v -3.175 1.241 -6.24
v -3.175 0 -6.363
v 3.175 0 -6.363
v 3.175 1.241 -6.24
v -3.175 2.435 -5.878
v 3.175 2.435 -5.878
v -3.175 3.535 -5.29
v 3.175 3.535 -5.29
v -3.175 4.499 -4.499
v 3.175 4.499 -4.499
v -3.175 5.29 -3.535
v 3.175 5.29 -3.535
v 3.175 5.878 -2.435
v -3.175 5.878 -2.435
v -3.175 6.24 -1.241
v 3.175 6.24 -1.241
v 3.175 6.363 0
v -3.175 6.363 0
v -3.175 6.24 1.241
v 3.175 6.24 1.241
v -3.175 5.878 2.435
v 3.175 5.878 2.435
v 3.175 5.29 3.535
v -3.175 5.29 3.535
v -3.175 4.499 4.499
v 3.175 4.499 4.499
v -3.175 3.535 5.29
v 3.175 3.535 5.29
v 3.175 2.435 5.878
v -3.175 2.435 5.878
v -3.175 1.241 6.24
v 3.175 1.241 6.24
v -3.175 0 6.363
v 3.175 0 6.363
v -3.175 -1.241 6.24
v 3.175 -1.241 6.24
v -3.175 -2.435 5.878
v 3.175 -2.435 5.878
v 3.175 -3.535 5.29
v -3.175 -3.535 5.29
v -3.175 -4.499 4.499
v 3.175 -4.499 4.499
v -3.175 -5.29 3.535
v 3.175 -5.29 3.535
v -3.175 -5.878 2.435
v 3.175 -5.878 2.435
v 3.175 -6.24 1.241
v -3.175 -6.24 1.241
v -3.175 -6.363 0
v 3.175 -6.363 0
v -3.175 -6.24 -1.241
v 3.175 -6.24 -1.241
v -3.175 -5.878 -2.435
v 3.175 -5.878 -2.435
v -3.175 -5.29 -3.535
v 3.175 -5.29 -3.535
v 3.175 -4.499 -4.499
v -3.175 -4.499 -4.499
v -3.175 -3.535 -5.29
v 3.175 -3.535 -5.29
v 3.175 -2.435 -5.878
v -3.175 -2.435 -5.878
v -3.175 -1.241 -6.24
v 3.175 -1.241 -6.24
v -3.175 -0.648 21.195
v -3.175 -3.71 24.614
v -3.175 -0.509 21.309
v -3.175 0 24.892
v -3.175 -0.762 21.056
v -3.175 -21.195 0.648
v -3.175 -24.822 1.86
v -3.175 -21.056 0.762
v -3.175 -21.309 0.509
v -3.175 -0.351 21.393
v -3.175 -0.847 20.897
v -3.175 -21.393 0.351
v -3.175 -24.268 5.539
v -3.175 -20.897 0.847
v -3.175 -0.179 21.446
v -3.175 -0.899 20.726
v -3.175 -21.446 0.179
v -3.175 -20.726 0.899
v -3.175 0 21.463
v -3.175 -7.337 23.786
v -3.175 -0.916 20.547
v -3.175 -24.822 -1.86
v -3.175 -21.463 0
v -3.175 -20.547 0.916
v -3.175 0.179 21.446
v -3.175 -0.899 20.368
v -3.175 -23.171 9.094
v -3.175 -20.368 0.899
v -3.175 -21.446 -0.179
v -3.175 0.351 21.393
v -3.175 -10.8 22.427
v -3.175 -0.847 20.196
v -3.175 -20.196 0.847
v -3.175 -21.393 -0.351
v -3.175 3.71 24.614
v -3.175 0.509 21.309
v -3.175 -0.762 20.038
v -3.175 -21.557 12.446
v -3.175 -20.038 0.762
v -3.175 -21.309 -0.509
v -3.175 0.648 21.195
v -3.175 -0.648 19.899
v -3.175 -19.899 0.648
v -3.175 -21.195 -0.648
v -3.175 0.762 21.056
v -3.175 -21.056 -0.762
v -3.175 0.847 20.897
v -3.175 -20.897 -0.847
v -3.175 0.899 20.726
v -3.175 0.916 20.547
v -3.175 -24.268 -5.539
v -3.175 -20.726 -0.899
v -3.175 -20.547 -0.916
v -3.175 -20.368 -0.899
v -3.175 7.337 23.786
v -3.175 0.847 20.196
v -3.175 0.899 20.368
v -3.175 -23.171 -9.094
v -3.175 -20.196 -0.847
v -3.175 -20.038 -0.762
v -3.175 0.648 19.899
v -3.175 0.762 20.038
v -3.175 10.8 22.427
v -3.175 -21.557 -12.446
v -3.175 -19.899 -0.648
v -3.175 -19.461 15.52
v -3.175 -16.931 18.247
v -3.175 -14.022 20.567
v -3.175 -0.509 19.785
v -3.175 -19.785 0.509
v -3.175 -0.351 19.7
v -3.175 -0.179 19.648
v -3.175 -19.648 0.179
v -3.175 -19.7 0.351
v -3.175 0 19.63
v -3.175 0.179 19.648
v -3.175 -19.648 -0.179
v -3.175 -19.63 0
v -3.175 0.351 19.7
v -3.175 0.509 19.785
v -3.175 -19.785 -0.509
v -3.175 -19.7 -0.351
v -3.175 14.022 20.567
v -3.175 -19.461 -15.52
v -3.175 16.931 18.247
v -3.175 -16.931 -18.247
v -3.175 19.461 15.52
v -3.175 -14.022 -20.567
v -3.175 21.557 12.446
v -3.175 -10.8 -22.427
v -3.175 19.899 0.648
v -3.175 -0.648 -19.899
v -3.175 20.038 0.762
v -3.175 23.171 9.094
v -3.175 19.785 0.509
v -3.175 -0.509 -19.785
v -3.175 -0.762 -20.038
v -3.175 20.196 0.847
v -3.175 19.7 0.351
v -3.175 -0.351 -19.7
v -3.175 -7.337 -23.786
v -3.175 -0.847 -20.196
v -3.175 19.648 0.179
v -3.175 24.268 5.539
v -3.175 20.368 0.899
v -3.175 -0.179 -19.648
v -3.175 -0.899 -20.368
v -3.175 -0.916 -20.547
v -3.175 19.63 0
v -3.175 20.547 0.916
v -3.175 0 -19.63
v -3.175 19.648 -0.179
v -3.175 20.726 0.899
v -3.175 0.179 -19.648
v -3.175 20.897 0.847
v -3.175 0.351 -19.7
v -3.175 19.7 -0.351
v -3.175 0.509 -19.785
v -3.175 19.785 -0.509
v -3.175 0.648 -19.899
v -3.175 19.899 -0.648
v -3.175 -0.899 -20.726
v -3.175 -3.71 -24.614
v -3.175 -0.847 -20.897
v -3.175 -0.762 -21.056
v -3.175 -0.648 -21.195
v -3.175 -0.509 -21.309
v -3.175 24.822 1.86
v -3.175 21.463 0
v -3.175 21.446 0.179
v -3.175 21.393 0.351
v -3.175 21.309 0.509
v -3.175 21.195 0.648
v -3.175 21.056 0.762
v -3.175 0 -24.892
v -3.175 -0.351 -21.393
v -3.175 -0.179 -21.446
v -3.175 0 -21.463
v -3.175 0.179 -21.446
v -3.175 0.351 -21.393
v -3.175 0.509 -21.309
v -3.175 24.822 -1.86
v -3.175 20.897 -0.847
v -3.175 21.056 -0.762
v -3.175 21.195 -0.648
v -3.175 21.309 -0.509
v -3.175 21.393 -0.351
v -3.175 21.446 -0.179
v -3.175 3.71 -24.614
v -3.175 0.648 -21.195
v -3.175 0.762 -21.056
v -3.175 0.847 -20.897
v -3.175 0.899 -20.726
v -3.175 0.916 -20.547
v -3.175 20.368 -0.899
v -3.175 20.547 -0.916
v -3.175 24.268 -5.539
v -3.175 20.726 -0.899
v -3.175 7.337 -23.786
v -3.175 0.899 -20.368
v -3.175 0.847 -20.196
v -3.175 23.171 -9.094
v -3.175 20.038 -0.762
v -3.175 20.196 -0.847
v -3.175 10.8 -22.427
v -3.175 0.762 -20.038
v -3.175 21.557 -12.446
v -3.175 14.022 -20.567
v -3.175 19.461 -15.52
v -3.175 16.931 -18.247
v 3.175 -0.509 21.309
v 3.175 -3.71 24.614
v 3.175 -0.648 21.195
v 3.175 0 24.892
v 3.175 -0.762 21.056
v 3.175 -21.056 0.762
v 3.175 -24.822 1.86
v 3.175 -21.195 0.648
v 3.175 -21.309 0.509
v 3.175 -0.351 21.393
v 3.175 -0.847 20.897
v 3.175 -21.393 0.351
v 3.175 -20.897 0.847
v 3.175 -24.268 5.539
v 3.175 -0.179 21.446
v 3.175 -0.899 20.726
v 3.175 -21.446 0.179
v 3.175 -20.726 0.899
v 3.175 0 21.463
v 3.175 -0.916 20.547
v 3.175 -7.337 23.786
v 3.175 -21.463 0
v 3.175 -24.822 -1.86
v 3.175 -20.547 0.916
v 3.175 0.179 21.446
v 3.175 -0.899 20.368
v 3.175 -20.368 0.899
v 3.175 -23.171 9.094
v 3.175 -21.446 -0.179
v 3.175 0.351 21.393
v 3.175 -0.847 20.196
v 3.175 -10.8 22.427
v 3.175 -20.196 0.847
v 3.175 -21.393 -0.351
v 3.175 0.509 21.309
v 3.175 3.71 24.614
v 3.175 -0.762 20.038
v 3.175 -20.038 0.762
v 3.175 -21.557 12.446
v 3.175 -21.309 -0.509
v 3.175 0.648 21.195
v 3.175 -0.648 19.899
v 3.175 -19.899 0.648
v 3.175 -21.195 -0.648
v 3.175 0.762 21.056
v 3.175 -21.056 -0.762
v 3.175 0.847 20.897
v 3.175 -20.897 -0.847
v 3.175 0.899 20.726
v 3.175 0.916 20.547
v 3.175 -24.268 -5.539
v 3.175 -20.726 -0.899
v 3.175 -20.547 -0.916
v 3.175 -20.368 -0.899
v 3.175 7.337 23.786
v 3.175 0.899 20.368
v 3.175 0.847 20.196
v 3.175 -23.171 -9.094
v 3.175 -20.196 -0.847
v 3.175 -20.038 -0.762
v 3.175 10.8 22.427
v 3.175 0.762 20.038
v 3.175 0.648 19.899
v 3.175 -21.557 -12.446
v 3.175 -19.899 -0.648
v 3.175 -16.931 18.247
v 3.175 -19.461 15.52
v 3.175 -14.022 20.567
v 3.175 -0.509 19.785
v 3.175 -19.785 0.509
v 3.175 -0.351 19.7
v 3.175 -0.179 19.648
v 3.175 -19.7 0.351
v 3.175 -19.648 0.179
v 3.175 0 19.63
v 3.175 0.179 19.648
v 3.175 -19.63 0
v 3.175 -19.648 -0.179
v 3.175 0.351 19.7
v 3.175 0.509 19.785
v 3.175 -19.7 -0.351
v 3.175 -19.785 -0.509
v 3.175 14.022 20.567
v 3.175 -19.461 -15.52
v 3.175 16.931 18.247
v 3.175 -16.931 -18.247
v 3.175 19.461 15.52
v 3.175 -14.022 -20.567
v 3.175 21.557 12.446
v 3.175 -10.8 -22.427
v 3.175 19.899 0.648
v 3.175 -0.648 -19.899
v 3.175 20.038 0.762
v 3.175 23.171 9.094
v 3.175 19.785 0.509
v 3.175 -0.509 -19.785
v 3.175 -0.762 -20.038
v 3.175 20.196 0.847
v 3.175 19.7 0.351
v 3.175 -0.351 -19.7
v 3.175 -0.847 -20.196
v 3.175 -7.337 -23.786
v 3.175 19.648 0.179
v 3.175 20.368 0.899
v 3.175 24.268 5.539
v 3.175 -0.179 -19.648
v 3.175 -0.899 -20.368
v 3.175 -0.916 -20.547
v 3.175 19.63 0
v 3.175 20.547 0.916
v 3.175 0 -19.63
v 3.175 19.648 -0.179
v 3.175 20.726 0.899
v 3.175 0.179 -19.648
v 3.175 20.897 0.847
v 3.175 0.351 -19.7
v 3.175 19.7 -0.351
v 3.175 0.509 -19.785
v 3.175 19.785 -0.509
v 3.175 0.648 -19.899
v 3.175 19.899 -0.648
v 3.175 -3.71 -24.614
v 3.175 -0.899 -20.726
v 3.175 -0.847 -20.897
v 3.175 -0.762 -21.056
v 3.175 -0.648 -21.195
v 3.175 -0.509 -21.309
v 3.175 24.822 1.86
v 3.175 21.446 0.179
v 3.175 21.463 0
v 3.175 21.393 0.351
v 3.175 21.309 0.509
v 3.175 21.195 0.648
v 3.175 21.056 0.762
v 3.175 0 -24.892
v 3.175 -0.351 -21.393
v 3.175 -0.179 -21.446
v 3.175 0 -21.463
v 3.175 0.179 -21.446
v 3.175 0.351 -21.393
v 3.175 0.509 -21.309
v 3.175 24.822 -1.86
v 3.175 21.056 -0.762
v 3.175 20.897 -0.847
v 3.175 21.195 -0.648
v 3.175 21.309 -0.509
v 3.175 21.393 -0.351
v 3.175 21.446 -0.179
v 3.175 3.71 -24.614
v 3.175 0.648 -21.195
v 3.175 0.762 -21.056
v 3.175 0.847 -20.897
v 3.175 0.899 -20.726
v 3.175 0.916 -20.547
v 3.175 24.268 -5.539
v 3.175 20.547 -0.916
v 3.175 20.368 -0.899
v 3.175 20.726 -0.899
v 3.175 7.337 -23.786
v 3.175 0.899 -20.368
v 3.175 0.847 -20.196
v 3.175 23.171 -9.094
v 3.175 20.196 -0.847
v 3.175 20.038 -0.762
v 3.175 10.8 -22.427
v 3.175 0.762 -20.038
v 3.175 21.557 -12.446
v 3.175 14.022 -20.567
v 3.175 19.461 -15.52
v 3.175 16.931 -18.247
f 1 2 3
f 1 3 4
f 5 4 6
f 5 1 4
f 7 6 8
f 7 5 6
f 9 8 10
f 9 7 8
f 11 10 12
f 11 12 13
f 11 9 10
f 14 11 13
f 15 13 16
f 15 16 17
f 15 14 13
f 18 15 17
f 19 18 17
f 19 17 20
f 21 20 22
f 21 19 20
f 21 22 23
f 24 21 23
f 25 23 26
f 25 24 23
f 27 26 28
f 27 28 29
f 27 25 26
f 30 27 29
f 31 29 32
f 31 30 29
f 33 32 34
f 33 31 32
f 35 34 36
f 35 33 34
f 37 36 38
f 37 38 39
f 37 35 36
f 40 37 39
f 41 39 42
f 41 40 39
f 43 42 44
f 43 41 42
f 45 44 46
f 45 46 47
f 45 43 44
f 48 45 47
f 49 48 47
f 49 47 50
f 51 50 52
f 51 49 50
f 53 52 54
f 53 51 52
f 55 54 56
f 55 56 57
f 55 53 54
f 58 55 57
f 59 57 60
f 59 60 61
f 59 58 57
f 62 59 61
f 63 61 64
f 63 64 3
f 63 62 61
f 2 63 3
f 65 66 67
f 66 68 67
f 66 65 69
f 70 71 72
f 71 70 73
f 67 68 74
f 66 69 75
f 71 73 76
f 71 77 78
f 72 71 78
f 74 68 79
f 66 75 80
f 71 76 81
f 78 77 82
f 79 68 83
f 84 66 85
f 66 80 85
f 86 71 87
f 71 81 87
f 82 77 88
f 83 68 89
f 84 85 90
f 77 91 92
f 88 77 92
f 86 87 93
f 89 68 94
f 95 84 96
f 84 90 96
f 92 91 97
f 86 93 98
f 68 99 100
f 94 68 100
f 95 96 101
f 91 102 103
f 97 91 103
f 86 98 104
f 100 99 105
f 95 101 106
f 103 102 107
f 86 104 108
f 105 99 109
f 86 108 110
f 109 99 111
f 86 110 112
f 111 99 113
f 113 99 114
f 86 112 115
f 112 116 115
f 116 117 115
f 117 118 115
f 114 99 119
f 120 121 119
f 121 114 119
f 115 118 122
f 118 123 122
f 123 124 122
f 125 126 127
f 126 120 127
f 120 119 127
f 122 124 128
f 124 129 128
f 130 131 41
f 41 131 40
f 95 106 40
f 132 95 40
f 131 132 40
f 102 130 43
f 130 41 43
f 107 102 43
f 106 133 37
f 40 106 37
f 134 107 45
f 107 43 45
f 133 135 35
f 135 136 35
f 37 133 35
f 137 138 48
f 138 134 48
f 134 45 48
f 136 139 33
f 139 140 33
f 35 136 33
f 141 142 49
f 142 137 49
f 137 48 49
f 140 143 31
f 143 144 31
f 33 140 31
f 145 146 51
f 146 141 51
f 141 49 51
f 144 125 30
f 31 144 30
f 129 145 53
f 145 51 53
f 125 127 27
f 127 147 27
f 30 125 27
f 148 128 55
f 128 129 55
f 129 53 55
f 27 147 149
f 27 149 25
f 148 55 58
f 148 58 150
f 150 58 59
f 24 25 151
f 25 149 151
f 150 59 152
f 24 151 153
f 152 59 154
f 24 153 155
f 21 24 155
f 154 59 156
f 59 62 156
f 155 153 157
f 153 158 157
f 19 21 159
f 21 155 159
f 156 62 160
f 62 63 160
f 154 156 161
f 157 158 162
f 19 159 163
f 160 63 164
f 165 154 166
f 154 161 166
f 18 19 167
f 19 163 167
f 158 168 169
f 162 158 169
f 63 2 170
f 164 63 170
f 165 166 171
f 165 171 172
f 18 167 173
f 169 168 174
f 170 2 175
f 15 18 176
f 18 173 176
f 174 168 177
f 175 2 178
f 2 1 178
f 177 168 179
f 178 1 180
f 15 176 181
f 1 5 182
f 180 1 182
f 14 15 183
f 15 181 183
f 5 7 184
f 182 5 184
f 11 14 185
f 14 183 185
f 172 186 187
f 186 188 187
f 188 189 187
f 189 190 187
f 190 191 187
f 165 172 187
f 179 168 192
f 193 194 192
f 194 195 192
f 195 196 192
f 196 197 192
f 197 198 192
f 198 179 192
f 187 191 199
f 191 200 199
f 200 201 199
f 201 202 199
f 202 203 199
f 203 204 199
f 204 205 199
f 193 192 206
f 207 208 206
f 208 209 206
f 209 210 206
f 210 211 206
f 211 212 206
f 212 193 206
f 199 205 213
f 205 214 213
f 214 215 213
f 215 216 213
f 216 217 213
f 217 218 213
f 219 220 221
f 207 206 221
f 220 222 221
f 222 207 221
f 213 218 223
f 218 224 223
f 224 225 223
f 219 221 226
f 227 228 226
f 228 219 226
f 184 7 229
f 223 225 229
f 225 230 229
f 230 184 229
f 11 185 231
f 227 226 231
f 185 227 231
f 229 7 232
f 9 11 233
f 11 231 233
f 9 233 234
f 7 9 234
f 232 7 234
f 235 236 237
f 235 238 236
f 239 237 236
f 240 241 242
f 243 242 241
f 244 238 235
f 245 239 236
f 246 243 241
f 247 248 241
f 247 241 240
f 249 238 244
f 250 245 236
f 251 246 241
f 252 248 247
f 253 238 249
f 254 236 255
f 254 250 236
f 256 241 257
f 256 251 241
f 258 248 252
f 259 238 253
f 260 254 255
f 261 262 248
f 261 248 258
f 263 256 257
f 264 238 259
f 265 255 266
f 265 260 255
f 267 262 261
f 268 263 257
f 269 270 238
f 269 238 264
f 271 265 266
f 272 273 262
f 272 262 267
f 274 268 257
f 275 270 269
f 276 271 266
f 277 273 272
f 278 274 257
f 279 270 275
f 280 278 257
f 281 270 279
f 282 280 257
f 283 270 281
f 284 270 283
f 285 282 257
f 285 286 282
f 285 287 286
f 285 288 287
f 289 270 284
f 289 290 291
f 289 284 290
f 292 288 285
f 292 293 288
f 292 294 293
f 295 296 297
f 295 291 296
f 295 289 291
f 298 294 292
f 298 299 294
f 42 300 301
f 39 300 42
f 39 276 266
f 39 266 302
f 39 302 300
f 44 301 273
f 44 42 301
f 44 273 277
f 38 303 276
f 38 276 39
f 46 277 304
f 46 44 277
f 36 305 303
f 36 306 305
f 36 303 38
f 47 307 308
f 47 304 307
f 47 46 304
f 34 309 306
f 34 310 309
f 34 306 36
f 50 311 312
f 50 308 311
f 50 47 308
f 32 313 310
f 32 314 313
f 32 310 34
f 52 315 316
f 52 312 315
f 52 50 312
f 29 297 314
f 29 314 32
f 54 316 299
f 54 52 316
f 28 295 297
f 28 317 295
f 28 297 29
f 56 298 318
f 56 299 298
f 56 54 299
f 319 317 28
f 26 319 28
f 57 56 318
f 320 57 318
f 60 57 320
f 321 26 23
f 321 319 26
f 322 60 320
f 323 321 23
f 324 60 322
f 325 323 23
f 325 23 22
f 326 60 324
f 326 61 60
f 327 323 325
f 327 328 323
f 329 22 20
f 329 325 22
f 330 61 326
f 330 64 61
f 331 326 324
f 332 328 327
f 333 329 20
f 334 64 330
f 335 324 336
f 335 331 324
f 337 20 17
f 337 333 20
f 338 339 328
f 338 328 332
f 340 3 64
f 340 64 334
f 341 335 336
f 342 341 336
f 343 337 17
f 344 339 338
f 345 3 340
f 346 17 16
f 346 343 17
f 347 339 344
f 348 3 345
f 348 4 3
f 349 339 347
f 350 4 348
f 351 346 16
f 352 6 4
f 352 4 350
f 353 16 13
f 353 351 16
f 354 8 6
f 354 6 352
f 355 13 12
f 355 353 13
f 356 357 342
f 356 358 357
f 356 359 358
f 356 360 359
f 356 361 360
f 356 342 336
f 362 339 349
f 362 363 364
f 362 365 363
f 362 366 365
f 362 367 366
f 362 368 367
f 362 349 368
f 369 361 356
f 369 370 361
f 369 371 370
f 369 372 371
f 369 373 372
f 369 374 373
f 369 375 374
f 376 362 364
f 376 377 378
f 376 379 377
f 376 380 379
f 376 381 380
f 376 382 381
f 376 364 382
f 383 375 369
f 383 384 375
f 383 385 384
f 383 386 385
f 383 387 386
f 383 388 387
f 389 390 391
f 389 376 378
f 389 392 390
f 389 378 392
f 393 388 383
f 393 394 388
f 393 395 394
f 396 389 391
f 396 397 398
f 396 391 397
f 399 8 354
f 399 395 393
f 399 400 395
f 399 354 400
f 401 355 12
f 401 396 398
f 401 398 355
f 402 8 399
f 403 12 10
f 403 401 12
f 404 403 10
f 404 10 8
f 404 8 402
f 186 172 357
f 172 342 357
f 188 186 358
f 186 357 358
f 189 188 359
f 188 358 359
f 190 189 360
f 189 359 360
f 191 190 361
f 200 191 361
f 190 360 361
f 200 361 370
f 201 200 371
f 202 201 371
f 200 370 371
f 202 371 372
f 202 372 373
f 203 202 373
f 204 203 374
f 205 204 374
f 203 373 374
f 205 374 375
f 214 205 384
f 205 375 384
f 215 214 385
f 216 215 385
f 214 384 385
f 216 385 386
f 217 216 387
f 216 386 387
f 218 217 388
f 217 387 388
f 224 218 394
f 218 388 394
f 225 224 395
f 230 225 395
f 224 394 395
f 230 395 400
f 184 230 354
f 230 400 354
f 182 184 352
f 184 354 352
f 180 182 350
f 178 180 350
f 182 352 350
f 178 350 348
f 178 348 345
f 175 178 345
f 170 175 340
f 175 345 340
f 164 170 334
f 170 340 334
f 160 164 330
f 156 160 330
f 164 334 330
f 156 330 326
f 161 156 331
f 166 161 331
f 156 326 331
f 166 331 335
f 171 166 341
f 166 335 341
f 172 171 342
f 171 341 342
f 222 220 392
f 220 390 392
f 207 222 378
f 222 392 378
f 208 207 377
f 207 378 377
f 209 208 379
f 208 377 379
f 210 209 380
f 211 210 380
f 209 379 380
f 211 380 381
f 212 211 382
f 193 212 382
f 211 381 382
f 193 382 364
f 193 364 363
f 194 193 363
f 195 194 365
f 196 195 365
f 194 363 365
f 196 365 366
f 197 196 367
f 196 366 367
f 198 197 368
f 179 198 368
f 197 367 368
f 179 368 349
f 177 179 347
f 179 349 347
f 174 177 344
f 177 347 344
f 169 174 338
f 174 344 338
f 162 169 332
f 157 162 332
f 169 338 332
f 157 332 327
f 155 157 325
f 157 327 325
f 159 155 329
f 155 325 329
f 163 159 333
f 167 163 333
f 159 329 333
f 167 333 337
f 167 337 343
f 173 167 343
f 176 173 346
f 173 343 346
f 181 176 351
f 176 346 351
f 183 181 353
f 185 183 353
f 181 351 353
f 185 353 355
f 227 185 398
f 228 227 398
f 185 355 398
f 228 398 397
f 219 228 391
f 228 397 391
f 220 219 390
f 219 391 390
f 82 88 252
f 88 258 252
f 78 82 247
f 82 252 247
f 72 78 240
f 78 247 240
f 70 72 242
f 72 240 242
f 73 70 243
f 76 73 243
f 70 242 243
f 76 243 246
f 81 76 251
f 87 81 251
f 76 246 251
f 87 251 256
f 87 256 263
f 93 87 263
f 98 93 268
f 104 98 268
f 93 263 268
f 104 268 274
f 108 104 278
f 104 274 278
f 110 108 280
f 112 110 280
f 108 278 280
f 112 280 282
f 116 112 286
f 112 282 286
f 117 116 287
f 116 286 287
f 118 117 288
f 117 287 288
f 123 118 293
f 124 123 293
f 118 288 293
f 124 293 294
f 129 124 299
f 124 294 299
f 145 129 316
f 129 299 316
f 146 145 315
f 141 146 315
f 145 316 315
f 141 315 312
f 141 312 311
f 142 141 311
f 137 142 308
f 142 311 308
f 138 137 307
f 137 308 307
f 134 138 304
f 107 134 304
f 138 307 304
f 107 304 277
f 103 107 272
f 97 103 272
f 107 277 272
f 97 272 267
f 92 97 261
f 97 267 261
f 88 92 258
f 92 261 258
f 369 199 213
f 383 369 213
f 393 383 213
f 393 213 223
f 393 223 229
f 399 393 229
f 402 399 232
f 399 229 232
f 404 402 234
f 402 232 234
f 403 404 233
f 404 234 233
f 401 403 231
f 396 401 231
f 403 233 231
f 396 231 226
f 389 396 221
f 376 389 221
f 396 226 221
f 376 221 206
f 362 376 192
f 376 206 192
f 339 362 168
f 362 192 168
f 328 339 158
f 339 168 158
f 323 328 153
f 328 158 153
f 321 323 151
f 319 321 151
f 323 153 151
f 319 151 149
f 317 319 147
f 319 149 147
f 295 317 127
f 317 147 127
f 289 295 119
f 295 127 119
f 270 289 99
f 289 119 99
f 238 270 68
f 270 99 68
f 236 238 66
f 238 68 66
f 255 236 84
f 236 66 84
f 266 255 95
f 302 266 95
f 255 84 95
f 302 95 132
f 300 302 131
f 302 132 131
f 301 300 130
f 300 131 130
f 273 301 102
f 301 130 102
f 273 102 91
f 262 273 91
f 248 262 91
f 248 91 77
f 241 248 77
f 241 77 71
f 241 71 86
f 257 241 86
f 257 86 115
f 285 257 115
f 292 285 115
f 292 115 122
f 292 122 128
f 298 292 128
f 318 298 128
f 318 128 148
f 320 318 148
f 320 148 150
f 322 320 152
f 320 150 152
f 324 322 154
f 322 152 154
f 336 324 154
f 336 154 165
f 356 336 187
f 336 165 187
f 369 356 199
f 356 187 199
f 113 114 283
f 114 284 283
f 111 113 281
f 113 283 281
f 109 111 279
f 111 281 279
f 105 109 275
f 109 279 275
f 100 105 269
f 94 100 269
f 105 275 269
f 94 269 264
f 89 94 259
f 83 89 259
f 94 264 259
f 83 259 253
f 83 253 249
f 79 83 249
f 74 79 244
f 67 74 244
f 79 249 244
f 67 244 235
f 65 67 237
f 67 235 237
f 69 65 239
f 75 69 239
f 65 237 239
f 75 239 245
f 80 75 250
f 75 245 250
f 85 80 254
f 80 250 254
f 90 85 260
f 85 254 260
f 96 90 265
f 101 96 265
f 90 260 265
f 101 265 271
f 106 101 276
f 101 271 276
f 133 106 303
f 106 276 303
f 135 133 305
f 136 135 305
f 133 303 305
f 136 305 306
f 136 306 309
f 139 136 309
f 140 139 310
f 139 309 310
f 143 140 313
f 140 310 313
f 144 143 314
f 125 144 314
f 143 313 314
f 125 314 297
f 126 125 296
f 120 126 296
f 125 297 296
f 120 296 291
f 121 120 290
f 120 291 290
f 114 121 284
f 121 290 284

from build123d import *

# Parameters (mm, degrees)
BOSS_EXTRUDE1_DEPTH      = 3.175
BOSS_EXTRUDE1_DEPTH_BACK = 3.175
SKETCH1_R                = 24.892
SKETCH1_R_2              = 6.3627
SKETCH2_R                = 0.916354932
CUT_EXTRUDE1_DEPTH       = 36.77073983
CIRPATTERN1_COUNT        = 4


with BuildPart() as part:
    # Sketch1 → Boss-Extrude1 (new, two sides: drawn at the far end of the back side and taken through both)
    with BuildSketch(Plane(origin=(0, 0, 0), x_dir=(0, 0, -1), z_dir=(1, 0, 0)).offset(-BOSS_EXTRUDE1_DEPTH_BACK)):
        Circle(SKETCH1_R)
        Circle(SKETCH1_R_2, mode=Mode.SUBTRACT)
    extrude(amount=BOSS_EXTRUDE1_DEPTH + BOSS_EXTRUDE1_DEPTH_BACK)

    # Sketch2 → Cut-Extrude1 (cut, symmetric)
    with BuildSketch(Plane(origin=(3.175, 0, 0), x_dir=(0, 0, -1), z_dir=(1, 0, 0))):
        with Locations((0, 20.546808672)):
            Circle(SKETCH2_R)
    cut_extrude1 = extrude(amount=CUT_EXTRUDE1_DEPTH, both=True, mode=Mode.SUBTRACT)

    # CirPattern1: Cut-Extrude1 ×4 about axis
    cirpattern1_axis = Axis((3.175, 0, 0), (1, 0, 0))
    for i in range(1, CIRPATTERN1_COUNT):
        add(cut_extrude1.rotate(cirpattern1_axis, i * 360 / CIRPATTERN1_COUNT), mode=Mode.SUBTRACT)


solid = part.part
